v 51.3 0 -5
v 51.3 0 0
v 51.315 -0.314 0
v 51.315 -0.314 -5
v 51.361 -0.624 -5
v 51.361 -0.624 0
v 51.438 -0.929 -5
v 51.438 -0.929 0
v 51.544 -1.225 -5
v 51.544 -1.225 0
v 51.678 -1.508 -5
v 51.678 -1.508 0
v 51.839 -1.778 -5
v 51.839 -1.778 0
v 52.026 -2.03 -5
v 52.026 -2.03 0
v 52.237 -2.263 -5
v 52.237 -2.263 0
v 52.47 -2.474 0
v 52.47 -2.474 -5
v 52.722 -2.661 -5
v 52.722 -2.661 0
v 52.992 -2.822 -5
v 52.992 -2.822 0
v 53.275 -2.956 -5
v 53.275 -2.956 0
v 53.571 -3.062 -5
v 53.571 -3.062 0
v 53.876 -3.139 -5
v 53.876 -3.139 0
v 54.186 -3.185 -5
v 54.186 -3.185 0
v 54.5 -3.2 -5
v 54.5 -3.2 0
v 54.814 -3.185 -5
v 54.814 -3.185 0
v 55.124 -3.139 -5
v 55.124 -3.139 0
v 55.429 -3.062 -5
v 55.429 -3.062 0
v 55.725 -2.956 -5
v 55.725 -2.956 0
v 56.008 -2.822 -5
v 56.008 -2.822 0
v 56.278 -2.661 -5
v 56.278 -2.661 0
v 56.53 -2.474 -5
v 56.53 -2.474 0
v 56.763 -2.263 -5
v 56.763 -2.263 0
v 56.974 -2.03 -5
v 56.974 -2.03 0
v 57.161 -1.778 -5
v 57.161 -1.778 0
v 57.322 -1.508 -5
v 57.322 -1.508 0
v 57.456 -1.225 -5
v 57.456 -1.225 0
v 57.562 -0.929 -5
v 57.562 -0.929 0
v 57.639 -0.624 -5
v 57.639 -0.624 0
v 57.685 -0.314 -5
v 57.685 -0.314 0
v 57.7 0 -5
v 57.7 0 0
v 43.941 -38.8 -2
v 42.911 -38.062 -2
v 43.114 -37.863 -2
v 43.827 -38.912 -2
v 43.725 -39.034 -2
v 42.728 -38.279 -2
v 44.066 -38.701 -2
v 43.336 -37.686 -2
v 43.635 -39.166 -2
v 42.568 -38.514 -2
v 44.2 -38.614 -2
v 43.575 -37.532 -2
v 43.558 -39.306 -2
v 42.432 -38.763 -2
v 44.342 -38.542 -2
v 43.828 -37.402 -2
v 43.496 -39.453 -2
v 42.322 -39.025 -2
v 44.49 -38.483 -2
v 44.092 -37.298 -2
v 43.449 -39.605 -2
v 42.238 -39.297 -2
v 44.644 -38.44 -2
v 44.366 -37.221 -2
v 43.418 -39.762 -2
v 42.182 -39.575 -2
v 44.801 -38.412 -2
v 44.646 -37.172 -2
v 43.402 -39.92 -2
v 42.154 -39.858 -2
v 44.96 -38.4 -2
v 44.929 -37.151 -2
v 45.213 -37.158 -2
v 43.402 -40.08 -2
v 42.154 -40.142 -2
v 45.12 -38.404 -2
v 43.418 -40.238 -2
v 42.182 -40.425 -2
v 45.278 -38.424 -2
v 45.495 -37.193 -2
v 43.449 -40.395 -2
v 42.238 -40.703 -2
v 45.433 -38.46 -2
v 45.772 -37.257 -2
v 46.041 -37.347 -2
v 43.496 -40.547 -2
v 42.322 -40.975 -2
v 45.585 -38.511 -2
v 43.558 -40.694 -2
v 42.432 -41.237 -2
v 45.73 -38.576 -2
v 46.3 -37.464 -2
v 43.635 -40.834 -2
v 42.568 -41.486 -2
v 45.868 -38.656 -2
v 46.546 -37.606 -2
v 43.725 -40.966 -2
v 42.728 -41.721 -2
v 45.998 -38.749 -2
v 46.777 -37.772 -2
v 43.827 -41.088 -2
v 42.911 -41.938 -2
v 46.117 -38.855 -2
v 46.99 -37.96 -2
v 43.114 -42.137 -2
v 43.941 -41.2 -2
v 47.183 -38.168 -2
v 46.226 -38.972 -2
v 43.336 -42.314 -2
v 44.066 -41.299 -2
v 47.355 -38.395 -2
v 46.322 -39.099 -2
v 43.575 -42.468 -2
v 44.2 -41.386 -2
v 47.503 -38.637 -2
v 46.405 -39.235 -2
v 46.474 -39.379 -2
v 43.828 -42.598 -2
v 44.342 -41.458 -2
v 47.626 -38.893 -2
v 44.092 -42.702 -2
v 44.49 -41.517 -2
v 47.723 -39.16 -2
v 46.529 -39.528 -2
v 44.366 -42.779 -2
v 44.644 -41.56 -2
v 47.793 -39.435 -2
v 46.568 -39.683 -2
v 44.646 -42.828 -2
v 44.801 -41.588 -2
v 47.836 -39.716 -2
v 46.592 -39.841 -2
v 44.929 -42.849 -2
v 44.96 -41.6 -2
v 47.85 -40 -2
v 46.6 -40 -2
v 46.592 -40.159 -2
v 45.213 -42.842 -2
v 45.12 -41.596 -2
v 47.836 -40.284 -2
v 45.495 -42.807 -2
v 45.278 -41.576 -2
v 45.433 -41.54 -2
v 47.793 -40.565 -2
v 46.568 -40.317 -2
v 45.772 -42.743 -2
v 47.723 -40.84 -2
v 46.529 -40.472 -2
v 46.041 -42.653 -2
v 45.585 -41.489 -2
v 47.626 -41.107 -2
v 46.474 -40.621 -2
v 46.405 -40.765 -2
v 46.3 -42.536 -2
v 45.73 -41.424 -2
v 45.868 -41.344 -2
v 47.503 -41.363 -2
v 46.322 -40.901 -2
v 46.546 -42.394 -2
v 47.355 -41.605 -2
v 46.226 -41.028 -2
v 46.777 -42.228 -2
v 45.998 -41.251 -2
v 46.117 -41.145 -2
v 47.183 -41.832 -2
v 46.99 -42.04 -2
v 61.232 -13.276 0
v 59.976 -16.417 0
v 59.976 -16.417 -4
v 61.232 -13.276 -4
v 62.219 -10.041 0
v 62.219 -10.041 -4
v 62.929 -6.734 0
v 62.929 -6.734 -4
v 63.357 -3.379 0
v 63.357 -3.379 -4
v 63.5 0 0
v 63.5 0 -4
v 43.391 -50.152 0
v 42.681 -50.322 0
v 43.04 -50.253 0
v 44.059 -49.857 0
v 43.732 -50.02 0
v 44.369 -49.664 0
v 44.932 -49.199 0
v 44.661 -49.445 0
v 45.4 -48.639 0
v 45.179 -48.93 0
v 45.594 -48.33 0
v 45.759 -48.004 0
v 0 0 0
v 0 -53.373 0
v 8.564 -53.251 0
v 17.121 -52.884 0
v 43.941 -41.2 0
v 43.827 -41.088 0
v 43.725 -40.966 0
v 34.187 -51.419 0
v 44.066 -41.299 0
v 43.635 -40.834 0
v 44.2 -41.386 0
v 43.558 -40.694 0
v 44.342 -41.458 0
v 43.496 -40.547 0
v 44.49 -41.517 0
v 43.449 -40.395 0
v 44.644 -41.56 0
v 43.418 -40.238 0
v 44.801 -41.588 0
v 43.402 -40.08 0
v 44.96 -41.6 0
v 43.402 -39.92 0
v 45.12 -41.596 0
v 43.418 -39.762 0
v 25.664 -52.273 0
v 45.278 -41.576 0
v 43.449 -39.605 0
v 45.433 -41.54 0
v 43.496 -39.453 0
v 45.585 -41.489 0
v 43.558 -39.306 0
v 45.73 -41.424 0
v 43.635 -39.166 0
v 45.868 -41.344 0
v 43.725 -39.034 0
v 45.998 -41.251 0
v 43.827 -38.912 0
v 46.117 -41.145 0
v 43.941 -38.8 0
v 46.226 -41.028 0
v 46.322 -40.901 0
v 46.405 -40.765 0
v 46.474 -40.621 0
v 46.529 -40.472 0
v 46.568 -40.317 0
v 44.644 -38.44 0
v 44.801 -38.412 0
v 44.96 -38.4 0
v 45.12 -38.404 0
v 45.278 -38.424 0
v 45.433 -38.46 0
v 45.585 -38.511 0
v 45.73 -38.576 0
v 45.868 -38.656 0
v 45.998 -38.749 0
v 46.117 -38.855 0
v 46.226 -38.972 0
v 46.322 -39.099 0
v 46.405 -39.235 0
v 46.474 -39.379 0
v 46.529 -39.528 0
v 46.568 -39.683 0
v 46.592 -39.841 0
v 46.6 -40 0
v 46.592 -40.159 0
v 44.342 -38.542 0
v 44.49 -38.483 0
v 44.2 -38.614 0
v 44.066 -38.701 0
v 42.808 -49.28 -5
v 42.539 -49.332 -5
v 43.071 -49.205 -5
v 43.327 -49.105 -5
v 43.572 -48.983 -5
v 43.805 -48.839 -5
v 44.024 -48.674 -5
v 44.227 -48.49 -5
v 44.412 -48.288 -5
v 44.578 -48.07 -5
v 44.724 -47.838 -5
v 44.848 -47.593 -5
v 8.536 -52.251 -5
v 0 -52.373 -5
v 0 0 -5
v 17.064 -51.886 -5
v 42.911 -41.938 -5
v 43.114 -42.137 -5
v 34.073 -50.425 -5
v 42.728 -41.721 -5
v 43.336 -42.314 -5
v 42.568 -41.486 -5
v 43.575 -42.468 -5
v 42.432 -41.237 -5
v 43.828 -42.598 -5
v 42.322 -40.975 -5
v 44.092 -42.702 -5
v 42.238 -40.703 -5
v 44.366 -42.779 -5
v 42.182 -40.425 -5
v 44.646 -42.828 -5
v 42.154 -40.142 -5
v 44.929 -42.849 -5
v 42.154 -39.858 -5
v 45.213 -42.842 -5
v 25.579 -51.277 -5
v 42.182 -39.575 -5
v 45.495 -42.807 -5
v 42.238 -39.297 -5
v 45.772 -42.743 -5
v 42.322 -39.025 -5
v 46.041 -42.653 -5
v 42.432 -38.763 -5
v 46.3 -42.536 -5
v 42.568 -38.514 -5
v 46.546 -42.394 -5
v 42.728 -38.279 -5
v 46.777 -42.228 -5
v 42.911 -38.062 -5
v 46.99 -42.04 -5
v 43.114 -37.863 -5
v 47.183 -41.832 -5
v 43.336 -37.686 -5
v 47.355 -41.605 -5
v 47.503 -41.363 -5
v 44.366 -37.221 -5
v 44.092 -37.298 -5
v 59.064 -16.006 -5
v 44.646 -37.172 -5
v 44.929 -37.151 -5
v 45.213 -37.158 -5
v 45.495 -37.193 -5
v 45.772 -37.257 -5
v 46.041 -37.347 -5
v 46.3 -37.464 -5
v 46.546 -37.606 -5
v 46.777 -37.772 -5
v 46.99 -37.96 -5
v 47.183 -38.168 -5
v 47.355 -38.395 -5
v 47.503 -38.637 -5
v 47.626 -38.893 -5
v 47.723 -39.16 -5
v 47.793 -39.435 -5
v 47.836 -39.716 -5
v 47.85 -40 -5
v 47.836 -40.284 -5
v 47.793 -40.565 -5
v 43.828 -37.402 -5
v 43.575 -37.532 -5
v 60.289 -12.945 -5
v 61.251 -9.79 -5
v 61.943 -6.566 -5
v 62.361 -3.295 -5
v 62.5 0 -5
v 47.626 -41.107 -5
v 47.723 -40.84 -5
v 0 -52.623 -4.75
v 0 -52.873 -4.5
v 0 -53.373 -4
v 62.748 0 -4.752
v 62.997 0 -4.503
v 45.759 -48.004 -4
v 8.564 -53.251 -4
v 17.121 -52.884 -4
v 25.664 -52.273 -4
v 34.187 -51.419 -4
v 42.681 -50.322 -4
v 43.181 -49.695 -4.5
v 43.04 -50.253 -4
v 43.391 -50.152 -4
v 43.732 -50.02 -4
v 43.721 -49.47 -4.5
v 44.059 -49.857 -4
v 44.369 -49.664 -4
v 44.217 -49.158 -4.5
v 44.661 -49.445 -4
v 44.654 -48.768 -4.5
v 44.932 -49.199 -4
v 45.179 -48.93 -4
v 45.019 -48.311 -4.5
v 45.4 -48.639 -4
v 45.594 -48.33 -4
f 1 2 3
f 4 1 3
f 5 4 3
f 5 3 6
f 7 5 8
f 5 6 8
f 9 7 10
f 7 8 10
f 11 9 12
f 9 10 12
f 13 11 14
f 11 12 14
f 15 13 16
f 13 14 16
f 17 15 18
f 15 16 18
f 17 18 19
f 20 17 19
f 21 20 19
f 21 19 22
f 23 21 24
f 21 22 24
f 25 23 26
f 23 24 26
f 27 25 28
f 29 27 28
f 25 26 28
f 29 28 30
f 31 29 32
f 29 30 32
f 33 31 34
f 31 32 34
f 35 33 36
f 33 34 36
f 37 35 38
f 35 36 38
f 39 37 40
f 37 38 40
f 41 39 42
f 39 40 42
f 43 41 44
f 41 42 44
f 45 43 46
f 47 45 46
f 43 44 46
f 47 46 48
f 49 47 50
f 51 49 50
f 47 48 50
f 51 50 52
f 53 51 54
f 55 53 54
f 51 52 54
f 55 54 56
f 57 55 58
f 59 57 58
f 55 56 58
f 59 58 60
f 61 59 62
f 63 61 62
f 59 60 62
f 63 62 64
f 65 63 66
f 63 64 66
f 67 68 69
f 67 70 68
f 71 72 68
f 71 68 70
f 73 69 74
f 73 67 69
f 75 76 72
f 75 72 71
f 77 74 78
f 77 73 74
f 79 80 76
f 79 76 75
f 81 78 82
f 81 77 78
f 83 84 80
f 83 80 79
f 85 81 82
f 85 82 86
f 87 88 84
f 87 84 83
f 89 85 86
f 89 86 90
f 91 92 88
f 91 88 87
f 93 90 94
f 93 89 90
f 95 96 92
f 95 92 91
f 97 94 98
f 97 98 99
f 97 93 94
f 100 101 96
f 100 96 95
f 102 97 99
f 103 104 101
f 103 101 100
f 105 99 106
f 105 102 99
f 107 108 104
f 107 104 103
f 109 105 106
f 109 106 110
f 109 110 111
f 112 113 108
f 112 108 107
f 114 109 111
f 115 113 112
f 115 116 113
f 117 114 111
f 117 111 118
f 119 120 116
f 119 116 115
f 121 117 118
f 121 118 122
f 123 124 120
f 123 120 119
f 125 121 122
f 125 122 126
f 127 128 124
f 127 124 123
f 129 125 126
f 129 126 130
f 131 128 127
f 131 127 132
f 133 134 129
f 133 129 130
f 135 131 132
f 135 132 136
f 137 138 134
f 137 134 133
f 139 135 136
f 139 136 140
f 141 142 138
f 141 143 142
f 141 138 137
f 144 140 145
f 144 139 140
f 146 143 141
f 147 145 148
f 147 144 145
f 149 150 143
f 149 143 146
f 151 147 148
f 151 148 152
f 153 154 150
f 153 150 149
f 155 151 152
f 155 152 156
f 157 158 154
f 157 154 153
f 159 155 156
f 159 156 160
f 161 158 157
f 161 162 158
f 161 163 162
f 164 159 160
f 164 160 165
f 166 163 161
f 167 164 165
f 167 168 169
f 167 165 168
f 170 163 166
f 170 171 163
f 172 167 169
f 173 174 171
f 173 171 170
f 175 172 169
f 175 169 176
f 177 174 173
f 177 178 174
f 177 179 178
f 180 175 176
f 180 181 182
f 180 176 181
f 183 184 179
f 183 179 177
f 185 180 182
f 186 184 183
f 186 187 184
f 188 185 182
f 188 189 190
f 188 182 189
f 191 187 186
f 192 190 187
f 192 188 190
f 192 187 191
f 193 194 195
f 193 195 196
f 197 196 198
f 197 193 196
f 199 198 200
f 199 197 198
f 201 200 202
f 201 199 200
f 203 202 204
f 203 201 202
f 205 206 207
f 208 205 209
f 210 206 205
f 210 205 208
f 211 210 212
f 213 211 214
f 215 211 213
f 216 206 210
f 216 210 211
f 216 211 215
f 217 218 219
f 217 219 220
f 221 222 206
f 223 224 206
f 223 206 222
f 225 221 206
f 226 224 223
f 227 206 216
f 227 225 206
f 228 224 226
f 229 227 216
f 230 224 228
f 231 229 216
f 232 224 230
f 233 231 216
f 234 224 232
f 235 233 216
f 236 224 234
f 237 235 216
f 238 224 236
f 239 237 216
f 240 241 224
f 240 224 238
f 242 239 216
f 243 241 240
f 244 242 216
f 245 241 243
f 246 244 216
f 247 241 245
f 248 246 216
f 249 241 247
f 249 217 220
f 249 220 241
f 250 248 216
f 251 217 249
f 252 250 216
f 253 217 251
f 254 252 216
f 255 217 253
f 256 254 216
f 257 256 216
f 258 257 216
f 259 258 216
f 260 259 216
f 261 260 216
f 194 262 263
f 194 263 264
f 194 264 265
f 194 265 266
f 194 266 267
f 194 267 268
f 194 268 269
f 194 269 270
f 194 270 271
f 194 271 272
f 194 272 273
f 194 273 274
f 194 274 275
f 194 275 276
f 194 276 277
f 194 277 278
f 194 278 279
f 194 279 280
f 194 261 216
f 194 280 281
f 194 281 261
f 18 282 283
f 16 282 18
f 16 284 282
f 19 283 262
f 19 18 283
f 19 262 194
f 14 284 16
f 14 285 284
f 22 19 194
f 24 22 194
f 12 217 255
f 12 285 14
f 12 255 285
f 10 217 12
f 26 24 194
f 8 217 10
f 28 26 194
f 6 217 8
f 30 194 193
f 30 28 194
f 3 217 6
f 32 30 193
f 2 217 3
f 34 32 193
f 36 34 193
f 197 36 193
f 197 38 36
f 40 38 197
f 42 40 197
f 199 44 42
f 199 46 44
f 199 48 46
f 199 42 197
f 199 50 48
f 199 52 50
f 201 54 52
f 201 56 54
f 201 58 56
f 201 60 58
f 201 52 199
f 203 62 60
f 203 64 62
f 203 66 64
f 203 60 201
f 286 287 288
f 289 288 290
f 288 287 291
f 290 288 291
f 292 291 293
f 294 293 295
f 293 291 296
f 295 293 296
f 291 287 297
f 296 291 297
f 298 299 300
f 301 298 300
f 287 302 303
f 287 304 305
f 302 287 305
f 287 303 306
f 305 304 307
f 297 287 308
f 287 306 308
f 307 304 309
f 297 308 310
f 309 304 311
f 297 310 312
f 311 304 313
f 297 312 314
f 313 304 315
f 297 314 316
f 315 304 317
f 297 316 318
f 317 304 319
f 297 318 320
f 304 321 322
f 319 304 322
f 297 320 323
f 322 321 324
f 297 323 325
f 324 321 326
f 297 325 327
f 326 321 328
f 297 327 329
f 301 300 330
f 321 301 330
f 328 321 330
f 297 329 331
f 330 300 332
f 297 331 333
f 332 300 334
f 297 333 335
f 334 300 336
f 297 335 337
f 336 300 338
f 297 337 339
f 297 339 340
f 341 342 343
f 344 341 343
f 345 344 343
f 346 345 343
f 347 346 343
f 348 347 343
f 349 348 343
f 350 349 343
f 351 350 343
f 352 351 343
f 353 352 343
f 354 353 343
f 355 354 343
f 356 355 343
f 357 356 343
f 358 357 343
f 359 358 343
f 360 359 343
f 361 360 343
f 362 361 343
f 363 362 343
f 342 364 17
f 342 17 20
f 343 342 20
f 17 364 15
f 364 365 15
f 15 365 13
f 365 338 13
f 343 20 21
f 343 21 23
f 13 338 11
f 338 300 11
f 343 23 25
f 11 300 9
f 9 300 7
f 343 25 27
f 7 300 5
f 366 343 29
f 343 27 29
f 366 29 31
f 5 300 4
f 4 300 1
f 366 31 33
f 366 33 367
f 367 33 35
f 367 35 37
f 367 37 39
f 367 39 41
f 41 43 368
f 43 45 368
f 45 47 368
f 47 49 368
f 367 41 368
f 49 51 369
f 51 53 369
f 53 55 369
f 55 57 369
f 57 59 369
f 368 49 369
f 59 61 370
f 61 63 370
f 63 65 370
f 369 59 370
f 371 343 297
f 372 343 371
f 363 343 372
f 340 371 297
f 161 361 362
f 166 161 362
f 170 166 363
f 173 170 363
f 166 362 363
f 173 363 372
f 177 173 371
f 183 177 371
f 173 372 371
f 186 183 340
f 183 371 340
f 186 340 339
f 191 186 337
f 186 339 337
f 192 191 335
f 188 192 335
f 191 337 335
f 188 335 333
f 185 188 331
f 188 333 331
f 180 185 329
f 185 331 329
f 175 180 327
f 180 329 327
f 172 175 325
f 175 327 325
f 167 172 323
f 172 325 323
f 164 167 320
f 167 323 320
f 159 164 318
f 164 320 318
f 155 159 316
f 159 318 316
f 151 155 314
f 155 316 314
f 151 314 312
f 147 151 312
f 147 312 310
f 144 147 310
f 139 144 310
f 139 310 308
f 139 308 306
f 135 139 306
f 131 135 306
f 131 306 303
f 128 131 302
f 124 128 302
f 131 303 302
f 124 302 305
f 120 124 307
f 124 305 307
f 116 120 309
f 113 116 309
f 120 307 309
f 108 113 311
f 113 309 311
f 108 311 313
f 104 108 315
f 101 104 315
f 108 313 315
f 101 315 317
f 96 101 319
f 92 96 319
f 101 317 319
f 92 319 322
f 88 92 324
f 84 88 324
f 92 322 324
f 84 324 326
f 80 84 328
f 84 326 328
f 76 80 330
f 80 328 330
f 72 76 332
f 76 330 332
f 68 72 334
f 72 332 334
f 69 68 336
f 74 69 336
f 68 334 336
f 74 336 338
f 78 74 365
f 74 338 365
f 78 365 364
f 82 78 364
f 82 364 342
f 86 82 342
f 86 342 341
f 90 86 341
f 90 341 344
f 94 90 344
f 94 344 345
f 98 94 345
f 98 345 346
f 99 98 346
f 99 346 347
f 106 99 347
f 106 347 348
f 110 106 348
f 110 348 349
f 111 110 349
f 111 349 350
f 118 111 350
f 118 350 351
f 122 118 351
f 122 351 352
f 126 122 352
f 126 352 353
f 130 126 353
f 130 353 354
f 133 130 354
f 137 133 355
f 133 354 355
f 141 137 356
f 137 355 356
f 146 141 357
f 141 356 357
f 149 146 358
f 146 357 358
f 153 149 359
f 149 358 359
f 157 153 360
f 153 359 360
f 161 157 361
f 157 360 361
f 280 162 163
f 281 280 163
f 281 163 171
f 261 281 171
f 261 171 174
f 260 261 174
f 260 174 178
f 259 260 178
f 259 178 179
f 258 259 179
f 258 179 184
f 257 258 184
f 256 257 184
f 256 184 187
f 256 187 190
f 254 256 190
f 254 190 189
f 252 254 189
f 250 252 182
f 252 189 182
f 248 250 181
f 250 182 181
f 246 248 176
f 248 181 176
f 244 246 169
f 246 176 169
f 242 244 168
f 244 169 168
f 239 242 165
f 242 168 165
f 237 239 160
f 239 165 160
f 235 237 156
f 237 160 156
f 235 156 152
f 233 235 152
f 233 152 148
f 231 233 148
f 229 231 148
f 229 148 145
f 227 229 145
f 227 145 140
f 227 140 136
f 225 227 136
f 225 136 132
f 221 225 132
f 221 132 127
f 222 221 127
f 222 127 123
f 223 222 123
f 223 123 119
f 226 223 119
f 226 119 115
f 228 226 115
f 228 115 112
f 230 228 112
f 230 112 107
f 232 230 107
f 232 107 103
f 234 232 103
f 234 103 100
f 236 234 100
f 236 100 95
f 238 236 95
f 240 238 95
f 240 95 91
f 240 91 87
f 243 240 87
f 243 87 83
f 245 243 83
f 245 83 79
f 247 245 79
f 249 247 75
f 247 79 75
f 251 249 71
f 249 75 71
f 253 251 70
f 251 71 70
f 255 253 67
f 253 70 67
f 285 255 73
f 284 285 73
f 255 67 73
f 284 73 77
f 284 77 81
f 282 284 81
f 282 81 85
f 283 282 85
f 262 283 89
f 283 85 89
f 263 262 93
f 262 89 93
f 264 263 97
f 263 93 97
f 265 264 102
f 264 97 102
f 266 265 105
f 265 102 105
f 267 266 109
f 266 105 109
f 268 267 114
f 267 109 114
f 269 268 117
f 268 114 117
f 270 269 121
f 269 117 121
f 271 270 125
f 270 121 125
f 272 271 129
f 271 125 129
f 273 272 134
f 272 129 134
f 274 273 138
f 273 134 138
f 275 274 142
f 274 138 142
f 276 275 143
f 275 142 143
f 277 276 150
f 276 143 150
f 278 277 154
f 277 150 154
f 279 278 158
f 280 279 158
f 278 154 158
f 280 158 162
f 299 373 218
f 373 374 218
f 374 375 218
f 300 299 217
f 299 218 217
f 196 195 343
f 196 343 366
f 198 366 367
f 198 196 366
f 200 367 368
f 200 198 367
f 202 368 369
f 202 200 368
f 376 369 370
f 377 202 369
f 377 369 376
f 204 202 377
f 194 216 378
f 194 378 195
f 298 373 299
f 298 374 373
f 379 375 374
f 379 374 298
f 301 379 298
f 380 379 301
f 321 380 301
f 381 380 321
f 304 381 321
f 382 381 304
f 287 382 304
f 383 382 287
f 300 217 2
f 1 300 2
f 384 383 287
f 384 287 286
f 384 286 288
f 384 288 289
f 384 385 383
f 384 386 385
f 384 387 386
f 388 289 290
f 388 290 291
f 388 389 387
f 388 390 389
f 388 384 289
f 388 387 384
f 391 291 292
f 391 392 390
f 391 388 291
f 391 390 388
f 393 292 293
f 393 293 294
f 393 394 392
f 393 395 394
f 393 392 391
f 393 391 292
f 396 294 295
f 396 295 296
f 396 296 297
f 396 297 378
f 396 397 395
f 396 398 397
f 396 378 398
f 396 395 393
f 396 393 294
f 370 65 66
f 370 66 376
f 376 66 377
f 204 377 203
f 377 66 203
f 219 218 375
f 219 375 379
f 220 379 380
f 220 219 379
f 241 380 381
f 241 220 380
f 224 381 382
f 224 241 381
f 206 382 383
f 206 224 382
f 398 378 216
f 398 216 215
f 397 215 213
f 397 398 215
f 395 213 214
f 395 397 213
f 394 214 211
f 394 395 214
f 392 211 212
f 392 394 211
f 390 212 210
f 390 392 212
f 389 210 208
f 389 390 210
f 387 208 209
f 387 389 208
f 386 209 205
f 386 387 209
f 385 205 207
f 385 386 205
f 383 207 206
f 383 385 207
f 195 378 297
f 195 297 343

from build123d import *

# Parameters (mm, degrees)
PAD001_DEPTH    = 5
SKETCH014_R     = 1.6
SKETCH014_R_2   = 3.2
POCKET003_DEPTH = 5.001
SKETCH015_R     = 2.85
POCKET004_DEPTH = 3
FILLET001_R     = 4
CHAMFER_SIZE    = 1


with BuildPart() as part:
    # Sketch010 → Pad001 (new body)
    with BuildSketch(Plane.XY):
        with BuildLine():
            Line((44.86111, -50), (59.975919, -16.416677))
            ThreePointArc((59.975919, -16.416677), (62.609058, -8.395333), (63.5, 0))
            Line((57.7, 0), (63.5, 0))
            ThreePointArc((51.3, 0), (54.5, -3.2), (57.7, 0))
            Line((0, 0), (51.3, 0))
            Line((0, -53.373162), (0, 0))
            ThreePointArc((0, -53.373162), (22.493874, -52.528683), (44.86111, -50))
        make_face()
    extrude(amount=-PAD001_DEPTH)

    # Sketch014 (on Face9 of Pad001) → Pocket003 (cut, through all)
    with BuildSketch(Plane(origin=(0, 0, -5), x_dir=(1, 0, 0), z_dir=(0, 0, -1))):
        with Locations((45, 40)):
            Circle(SKETCH014_R)
        with Locations((54.5, 0)):
            Circle(SKETCH014_R_2)
    extrude(amount=-POCKET003_DEPTH, mode=Mode.SUBTRACT)

    # Sketch015 (on Face5 of Pocket003) → Pocket004 (cut)
    with BuildSketch(Plane(origin=(0, 0, -5), x_dir=(1, 0, 0), z_dir=(0, 0, -1))):
        with Locations((45, 40)):
            Circle(SKETCH015_R)
    extrude(amount=-POCKET004_DEPTH, mode=Mode.SUBTRACT)

    # Fillet001
    fillet001_edges = [part.edges().sort_by_distance(p)[0] for p in [
        (44.86111, -50, -2.5),
    ]]
    fillet(fillet001_edges, radius=FILLET001_R)

    # Chamfer
    chamfer_edges = [part.edges().sort_by_distance(p)[0] for p in [
        (21.394971, -52.609282, -5),
    ]]
    chamfer(chamfer_edges, length=CHAMFER_SIZE)


solid = part.part
